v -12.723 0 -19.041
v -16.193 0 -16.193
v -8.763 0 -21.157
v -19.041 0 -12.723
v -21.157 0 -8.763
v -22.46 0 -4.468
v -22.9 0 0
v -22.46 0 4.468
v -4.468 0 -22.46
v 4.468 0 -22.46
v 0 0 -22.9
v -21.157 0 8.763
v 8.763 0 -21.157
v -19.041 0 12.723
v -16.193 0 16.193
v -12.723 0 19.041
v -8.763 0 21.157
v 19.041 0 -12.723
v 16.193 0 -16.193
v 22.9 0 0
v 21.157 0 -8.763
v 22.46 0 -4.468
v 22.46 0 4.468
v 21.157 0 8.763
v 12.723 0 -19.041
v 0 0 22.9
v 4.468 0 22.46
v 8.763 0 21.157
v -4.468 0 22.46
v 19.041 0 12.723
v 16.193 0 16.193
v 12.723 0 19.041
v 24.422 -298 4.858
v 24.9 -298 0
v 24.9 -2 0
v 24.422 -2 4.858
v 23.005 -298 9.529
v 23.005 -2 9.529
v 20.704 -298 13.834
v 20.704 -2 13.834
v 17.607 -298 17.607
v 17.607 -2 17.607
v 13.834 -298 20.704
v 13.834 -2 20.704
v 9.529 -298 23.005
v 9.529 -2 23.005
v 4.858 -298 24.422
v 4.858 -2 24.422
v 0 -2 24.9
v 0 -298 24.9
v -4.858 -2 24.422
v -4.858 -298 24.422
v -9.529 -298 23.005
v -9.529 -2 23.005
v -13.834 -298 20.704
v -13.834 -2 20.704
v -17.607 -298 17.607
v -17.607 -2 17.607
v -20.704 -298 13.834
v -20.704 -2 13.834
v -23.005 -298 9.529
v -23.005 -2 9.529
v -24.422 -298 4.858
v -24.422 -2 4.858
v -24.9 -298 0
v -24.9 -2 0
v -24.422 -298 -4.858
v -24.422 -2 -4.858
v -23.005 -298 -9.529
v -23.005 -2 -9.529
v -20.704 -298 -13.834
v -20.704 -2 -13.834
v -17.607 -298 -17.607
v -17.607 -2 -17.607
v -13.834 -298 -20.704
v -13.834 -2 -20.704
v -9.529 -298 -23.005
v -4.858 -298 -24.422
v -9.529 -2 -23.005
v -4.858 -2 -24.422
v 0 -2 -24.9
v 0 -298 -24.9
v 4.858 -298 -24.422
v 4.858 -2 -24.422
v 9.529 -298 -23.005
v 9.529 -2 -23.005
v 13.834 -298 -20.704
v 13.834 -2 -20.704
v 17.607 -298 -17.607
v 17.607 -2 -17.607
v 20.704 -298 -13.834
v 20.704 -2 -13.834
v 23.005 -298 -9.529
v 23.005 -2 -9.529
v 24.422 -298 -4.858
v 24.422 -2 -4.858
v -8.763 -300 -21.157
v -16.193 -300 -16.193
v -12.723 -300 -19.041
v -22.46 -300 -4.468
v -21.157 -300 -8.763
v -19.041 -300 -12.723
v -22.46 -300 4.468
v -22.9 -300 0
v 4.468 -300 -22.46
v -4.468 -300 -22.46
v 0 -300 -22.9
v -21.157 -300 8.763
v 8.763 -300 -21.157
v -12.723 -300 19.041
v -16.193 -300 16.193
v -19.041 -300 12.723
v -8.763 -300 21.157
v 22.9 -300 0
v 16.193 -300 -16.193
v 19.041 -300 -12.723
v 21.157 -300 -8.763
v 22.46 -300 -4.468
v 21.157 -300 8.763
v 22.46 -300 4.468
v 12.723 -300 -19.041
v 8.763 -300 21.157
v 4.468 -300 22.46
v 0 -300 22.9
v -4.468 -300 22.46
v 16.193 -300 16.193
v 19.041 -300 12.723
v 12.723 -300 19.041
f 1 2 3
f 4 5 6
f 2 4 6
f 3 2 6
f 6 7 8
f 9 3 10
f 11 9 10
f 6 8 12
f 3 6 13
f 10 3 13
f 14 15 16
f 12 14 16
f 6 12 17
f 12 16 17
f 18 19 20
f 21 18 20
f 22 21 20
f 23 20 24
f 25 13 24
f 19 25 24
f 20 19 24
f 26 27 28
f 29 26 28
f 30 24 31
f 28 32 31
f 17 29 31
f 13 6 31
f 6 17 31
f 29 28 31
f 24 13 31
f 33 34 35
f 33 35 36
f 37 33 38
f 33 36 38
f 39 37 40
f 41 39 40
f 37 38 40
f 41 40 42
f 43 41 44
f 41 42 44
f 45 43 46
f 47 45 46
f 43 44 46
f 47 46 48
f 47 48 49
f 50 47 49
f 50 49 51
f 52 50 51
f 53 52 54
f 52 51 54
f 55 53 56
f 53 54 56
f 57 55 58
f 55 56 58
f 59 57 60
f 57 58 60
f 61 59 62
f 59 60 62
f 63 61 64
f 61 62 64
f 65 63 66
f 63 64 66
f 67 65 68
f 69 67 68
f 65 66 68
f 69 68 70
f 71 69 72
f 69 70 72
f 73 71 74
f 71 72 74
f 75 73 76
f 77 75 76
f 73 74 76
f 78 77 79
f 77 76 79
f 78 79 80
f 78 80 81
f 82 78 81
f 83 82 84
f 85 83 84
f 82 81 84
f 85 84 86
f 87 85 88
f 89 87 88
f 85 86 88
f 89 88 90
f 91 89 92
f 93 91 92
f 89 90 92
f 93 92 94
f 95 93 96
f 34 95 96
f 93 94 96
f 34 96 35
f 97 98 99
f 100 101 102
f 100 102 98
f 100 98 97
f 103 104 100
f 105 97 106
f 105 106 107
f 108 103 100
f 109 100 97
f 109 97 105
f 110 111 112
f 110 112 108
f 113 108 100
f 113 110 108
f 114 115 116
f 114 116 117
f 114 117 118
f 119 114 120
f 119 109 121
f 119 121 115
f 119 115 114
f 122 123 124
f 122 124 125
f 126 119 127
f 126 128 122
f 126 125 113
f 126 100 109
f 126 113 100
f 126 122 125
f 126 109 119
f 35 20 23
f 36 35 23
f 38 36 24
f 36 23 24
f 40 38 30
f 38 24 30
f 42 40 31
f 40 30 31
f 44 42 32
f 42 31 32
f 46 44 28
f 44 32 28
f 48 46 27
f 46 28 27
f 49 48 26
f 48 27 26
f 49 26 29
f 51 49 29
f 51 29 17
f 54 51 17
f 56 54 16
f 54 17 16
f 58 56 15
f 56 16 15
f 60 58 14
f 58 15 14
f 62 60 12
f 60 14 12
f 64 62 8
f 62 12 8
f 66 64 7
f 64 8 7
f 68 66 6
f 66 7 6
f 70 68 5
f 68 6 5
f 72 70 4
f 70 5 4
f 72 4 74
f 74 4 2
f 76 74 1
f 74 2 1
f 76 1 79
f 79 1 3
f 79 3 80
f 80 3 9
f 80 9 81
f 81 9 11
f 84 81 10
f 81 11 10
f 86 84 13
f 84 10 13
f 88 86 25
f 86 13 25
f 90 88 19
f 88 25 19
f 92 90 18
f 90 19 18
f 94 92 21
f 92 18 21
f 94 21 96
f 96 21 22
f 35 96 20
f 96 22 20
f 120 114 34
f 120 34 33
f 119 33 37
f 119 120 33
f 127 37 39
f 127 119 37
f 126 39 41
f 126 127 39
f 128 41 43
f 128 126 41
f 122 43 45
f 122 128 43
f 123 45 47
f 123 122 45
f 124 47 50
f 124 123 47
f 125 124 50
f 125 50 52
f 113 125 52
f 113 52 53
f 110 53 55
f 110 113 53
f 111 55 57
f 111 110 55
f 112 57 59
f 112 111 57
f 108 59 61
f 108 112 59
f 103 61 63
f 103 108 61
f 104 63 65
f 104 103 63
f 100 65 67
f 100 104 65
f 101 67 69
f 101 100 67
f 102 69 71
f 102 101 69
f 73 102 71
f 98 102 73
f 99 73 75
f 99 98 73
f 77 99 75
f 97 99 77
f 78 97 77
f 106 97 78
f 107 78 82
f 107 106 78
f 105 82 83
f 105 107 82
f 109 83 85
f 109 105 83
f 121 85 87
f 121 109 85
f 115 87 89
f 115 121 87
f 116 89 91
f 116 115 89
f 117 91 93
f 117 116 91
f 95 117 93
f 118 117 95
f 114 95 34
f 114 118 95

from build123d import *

# Parameters (mm, degrees)
F0_R     = 24.9
F1_DEPTH = 300
F2_SIZE  = 2
F3_SIZE  = 2


with BuildPart() as f1:
    # F0 (on Front) → F1 (new body)
    with BuildSketch(Plane.XZ):
        Circle(F0_R)
    extrude(amount=F1_DEPTH)

    # F2
    f2_edges = [f1.edges().sort_by_distance(p)[0] for p in [
        (-24.9, -300, 0),
    ]]
    chamfer(f2_edges, length=F2_SIZE)

    # F3
    f3_edges = [f1.edges().sort_by_distance(p)[0] for p in [
        (-24.9, 0, 0),
    ]]
    chamfer(f3_edges, length=F3_SIZE)


solid = f1.part
